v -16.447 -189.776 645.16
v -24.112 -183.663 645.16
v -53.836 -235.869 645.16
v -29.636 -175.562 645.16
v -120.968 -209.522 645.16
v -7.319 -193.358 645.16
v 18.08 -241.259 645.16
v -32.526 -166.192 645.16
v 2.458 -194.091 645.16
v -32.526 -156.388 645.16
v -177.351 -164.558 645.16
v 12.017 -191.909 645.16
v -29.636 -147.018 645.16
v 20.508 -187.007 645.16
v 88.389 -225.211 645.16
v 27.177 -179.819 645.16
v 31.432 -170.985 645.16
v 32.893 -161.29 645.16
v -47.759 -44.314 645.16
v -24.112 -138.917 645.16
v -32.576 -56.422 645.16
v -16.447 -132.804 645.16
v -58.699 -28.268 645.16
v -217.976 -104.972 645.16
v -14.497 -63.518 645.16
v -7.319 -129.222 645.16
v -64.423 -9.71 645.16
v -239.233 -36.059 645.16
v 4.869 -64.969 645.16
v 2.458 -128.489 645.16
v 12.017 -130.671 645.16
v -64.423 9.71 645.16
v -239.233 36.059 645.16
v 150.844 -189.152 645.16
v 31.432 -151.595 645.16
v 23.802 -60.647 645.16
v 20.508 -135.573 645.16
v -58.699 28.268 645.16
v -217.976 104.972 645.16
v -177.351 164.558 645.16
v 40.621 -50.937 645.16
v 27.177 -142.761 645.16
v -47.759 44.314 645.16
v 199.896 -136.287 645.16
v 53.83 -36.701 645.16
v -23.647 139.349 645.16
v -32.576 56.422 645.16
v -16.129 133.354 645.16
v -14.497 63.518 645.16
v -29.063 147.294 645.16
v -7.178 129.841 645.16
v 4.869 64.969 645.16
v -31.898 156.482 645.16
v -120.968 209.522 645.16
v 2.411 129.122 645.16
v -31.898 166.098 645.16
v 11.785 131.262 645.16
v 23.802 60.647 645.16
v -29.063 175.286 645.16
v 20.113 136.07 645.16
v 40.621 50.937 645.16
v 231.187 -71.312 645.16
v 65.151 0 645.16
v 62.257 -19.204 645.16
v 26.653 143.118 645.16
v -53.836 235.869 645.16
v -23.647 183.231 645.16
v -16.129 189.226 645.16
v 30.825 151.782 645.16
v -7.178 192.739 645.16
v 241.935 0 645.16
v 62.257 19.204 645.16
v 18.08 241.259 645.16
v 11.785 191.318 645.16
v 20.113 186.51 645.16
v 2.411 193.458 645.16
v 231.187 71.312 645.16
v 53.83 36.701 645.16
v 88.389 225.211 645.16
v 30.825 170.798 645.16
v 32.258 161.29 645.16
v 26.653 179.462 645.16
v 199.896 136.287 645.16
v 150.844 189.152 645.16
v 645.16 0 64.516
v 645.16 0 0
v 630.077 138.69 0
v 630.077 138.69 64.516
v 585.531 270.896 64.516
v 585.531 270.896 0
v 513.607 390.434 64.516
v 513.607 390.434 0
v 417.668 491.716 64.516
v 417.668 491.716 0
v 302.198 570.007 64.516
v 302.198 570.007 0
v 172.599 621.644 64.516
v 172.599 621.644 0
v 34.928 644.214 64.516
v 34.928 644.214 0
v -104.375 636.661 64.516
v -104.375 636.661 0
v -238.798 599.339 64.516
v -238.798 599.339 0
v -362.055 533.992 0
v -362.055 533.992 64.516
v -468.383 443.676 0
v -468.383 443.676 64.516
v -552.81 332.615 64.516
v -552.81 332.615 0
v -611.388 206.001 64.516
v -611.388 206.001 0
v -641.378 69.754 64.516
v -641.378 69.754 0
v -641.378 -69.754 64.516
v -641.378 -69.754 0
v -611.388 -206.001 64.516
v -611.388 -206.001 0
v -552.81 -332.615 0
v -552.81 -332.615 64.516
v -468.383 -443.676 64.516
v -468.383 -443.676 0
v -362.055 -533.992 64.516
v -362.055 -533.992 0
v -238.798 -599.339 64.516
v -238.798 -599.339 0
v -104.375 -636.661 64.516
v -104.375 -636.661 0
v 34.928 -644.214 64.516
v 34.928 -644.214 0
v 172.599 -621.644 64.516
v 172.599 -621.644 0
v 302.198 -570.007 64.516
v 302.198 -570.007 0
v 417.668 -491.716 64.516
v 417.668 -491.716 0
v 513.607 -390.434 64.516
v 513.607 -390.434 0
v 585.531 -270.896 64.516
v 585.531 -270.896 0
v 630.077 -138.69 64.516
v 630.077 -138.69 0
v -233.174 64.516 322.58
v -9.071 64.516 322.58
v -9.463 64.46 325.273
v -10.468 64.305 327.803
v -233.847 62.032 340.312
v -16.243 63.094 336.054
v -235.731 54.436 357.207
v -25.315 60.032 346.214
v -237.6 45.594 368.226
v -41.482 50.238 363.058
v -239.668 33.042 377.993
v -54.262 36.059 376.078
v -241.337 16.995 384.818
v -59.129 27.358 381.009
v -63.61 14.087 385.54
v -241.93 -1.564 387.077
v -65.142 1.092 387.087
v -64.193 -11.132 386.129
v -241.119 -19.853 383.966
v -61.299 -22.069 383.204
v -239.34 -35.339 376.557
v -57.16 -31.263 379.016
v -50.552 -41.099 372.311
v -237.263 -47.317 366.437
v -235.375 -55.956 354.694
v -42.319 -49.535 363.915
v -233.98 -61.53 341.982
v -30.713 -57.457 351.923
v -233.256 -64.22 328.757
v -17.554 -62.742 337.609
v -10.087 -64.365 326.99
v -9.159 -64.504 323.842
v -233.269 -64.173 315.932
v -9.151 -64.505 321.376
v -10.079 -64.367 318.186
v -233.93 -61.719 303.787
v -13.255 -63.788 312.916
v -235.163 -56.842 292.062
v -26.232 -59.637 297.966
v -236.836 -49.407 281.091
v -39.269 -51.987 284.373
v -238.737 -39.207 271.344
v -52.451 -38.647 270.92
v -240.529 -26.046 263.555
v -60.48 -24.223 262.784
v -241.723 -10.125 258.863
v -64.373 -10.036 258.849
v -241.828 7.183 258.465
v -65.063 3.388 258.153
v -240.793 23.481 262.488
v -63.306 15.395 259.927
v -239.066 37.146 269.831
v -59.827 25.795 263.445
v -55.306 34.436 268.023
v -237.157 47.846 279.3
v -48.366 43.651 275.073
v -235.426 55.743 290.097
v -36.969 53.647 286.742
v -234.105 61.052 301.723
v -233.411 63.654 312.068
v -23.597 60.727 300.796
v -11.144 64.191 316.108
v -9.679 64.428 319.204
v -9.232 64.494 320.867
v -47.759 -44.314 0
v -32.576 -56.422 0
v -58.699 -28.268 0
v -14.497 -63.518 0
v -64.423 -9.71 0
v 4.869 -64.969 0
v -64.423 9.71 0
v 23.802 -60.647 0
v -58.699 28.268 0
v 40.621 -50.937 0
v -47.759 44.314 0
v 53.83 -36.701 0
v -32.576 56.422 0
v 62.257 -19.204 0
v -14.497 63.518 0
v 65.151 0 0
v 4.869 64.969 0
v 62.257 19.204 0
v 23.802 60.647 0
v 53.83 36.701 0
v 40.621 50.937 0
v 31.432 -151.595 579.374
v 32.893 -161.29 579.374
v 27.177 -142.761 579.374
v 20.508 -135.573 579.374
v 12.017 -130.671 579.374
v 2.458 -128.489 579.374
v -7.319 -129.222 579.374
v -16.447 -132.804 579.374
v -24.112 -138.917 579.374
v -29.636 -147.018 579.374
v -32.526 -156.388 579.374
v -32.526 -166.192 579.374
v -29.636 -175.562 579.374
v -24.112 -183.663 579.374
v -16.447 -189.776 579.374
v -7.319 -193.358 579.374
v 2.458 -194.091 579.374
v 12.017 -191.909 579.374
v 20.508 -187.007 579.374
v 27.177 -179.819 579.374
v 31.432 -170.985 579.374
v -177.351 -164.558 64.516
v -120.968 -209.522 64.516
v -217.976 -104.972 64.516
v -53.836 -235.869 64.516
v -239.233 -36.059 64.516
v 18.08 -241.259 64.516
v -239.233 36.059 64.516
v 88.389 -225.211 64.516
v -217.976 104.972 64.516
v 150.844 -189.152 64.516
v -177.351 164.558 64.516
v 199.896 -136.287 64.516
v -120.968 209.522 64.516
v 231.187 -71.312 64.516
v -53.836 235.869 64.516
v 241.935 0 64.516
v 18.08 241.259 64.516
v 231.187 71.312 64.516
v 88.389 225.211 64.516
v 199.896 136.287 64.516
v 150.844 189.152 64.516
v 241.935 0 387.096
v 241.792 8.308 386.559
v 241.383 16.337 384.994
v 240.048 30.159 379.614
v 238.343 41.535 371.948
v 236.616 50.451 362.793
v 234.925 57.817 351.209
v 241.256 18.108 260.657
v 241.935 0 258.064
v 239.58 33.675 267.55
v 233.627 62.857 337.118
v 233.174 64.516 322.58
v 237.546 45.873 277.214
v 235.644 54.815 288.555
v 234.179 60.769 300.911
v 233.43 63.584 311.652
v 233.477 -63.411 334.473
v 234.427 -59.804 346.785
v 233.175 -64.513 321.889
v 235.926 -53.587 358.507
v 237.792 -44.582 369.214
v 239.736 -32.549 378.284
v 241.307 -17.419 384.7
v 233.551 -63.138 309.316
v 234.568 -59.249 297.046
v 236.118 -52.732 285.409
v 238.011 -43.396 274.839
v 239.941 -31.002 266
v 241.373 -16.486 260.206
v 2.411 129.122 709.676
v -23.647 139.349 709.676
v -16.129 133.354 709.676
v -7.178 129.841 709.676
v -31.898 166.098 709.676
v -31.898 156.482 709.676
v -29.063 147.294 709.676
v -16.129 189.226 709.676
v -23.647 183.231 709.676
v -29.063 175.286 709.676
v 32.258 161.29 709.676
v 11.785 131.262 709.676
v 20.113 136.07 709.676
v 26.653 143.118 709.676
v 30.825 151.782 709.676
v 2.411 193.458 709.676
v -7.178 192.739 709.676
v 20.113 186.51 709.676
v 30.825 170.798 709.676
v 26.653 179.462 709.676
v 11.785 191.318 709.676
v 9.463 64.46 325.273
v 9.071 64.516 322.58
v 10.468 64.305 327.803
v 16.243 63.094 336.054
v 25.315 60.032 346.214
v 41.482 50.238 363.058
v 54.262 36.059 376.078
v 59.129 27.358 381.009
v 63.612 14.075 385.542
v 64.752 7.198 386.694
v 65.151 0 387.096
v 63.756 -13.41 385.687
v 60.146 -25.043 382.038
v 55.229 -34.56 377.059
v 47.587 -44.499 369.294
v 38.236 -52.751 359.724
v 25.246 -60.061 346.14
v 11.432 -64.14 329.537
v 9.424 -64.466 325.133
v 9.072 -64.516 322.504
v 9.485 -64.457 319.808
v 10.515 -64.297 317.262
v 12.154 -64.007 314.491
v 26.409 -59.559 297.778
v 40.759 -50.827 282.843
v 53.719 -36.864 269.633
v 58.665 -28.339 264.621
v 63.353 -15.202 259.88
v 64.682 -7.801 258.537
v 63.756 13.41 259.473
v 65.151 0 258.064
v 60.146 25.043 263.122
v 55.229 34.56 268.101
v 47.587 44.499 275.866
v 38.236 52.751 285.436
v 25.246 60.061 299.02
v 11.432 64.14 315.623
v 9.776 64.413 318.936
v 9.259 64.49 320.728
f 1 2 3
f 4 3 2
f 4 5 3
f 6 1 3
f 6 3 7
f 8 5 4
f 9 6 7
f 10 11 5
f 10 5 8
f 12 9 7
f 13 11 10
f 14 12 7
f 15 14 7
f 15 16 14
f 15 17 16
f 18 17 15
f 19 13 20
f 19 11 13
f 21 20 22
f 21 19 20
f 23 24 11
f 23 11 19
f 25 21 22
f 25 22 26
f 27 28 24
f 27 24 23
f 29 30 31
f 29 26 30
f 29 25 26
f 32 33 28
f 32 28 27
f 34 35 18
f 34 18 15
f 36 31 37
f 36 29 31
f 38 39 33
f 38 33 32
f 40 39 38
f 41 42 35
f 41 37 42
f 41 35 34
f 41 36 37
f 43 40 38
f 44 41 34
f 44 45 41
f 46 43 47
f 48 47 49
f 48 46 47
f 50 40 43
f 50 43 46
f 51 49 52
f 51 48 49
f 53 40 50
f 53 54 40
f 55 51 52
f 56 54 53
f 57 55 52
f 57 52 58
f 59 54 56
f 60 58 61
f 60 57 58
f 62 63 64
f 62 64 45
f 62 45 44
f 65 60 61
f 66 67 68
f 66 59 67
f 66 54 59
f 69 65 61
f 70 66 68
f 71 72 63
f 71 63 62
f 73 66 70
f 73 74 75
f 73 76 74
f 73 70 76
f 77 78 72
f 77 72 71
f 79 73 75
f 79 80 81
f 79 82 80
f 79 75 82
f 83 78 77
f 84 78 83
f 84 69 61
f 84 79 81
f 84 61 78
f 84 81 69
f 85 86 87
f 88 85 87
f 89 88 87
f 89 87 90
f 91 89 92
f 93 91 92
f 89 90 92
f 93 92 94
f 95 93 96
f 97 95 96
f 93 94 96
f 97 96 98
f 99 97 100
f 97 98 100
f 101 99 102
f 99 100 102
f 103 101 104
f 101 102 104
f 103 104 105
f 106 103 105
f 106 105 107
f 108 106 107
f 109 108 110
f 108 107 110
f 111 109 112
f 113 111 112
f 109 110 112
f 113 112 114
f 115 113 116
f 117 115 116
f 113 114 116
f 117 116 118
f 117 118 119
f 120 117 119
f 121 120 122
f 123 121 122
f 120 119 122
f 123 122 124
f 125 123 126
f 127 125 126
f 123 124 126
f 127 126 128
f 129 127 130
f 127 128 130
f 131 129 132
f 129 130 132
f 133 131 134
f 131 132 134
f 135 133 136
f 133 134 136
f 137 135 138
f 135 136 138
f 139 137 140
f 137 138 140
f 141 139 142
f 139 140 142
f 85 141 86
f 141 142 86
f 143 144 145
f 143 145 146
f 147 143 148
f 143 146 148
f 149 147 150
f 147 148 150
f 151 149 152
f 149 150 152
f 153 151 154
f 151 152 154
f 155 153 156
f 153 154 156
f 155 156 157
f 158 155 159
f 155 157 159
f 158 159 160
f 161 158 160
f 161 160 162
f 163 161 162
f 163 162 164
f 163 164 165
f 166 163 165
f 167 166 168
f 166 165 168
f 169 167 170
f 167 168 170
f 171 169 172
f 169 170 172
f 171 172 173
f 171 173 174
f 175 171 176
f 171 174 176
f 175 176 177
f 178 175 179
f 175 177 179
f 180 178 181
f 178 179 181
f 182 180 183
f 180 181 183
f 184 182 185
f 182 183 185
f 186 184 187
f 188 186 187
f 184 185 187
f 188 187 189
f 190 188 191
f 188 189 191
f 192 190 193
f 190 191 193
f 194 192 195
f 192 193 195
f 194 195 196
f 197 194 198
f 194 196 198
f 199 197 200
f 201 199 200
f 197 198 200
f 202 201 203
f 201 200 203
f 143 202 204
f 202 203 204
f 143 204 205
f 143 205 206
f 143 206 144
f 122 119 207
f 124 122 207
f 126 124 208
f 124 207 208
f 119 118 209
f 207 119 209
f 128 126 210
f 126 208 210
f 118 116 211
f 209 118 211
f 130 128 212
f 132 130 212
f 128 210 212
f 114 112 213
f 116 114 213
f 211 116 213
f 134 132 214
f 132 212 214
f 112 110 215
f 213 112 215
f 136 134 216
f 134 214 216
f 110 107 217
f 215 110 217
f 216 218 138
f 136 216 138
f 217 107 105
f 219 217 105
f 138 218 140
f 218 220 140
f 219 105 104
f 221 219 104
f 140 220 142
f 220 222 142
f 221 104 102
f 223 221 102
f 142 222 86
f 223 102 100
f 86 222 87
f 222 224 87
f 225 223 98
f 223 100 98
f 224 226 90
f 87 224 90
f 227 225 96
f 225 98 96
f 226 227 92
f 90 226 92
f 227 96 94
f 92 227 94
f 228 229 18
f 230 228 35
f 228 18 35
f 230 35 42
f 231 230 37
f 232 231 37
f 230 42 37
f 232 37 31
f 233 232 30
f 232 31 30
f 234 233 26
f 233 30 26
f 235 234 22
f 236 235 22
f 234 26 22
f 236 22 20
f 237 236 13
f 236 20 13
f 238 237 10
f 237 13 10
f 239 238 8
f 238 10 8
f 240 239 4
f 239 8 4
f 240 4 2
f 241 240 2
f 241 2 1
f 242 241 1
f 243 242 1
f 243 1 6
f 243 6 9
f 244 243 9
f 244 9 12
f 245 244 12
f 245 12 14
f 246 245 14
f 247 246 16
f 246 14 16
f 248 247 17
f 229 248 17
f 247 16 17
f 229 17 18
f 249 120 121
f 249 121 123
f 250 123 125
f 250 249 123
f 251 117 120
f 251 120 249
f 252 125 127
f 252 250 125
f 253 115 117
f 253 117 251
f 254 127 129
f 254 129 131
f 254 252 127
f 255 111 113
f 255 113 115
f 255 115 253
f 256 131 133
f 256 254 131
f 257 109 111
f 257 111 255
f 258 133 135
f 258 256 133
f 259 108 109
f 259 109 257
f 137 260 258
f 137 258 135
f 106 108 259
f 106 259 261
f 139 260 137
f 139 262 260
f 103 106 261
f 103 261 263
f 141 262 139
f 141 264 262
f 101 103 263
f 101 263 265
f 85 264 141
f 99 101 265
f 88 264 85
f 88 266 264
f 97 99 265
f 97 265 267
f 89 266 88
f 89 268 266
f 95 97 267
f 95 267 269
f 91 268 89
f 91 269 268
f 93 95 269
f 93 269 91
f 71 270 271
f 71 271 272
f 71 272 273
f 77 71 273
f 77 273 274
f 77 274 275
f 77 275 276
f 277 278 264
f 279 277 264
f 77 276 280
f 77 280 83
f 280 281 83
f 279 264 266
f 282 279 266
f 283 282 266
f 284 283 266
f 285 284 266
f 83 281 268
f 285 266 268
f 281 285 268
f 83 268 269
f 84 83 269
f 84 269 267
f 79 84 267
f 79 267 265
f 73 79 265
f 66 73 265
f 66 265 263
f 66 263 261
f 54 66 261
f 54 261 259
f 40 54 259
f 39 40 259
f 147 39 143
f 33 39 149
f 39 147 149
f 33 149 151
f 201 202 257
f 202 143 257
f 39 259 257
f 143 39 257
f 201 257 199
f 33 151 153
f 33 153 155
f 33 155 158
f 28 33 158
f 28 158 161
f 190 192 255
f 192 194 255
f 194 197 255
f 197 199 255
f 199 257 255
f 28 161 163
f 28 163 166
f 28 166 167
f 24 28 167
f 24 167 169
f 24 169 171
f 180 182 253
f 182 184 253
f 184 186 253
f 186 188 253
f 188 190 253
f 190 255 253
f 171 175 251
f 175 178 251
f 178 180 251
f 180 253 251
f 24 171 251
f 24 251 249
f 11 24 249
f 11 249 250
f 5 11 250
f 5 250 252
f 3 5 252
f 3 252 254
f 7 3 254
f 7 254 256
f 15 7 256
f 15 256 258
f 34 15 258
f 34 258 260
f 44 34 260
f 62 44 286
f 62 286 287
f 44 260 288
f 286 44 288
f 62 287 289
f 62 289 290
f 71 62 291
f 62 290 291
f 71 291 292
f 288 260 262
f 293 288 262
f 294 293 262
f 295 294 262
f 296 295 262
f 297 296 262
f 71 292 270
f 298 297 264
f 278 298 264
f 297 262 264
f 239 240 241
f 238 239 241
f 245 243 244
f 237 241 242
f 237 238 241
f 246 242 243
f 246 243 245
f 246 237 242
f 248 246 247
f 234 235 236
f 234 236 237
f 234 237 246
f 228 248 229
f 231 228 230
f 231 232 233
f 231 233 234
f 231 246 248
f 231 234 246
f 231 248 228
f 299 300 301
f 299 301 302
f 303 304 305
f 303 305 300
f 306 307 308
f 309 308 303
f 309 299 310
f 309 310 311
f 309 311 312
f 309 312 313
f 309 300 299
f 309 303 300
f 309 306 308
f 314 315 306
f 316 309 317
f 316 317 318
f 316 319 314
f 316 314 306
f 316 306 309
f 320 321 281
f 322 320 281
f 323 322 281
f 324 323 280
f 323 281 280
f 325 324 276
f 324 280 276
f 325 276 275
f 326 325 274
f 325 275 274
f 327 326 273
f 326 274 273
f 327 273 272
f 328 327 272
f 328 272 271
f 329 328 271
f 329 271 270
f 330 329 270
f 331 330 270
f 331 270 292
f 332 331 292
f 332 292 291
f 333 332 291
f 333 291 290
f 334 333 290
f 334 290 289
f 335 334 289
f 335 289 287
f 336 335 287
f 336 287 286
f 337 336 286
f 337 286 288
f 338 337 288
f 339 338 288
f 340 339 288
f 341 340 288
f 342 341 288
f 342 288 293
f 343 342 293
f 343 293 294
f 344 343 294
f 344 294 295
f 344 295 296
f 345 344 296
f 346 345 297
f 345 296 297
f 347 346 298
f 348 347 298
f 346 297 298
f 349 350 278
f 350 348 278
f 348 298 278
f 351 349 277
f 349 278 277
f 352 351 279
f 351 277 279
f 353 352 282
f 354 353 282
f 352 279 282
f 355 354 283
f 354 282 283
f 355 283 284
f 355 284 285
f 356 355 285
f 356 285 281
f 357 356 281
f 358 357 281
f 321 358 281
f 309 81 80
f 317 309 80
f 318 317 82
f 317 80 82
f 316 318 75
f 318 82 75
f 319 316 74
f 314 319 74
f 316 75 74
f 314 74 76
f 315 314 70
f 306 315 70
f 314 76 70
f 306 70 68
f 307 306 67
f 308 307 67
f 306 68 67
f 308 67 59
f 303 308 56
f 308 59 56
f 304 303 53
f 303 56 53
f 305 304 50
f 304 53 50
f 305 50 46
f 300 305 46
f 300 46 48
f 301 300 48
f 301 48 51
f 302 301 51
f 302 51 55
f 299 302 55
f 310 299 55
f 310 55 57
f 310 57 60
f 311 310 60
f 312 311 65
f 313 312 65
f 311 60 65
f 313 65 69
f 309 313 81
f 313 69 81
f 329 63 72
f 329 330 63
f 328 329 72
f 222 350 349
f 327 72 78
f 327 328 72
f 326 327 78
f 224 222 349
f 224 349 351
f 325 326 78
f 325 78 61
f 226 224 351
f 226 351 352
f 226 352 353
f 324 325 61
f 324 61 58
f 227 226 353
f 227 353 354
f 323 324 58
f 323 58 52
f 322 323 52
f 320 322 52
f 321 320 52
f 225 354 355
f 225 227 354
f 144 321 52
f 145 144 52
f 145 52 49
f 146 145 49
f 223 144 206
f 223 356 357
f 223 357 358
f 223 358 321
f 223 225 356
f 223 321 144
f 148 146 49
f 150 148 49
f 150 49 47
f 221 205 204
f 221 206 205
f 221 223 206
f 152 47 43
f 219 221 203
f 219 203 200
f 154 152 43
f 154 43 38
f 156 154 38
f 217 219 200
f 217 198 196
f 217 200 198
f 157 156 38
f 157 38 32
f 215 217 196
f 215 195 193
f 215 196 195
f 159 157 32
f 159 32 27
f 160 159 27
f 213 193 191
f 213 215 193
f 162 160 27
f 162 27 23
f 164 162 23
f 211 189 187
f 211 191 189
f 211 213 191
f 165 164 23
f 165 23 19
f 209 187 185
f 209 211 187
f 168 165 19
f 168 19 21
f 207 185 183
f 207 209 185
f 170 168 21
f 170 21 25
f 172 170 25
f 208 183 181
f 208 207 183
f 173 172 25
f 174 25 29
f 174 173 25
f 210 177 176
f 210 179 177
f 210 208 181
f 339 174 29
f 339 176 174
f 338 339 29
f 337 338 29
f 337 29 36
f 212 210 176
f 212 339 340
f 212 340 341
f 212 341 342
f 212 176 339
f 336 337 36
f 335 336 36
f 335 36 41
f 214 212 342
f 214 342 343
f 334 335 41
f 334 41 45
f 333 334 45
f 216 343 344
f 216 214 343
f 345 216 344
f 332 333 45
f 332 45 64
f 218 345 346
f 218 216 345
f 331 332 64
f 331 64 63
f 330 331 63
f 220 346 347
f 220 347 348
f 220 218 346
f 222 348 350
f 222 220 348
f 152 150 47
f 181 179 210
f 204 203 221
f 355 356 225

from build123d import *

# Parameters (mm, degrees)
F1_R      = 645.16
F3_DEPTH  = 64.516
F2_R      = 241.935
F4_DEPTH  = 645.16
F0_R      = 65.151
F5_DEPTH  = 645.161
F6_R      = 64.516377
F7_DEPTH  = 127000
F8_R      = 32.258
F10_DEPTH = 64.516
F9_R      = 32.893
F11_DEPTH = 65.786


with BuildPart() as f3:
    # F1 (on Top) → F3 (new body)
    with BuildSketch(Plane.XY):
        Circle(F1_R)
    extrude(amount=F3_DEPTH)

    # F2 (on Top) → F4 (join)
    with BuildSketch(Plane.XY):
        Circle(F2_R)
    extrude(amount=F4_DEPTH)

    # F0 (on Top) → F5 (cut, through all)
    with BuildSketch(Plane.XY):
        Circle(F0_R)
    extrude(amount=F5_DEPTH, mode=Mode.SUBTRACT)

    # F6 (on Right) → F7 (cut, symmetric)
    with BuildSketch(Plane.YZ):
        with Locations((0, 322.58)):
            Circle(F6_R)
    extrude(amount=F7_DEPTH, both=True, mode=Mode.SUBTRACT)

    # F8 (on face) → F10 (join)
    with BuildSketch(Plane.XY.offset(645.16)):
        with Locations((0, 161.29)):
            Circle(F8_R)
    extrude(amount=F10_DEPTH)

    # F9 (on face) → F11 (cut)
    with BuildSketch(Plane.XY.offset(645.16)):
        with Locations((0, -161.29)):
            Circle(F9_R)
    extrude(amount=-F11_DEPTH, mode=Mode.SUBTRACT)


with BuildPart() as f12_1:
    # F12: copy of F3
    add(f3.part.moved(Location((1879.6, 0, 0))))


solid = f3.part
